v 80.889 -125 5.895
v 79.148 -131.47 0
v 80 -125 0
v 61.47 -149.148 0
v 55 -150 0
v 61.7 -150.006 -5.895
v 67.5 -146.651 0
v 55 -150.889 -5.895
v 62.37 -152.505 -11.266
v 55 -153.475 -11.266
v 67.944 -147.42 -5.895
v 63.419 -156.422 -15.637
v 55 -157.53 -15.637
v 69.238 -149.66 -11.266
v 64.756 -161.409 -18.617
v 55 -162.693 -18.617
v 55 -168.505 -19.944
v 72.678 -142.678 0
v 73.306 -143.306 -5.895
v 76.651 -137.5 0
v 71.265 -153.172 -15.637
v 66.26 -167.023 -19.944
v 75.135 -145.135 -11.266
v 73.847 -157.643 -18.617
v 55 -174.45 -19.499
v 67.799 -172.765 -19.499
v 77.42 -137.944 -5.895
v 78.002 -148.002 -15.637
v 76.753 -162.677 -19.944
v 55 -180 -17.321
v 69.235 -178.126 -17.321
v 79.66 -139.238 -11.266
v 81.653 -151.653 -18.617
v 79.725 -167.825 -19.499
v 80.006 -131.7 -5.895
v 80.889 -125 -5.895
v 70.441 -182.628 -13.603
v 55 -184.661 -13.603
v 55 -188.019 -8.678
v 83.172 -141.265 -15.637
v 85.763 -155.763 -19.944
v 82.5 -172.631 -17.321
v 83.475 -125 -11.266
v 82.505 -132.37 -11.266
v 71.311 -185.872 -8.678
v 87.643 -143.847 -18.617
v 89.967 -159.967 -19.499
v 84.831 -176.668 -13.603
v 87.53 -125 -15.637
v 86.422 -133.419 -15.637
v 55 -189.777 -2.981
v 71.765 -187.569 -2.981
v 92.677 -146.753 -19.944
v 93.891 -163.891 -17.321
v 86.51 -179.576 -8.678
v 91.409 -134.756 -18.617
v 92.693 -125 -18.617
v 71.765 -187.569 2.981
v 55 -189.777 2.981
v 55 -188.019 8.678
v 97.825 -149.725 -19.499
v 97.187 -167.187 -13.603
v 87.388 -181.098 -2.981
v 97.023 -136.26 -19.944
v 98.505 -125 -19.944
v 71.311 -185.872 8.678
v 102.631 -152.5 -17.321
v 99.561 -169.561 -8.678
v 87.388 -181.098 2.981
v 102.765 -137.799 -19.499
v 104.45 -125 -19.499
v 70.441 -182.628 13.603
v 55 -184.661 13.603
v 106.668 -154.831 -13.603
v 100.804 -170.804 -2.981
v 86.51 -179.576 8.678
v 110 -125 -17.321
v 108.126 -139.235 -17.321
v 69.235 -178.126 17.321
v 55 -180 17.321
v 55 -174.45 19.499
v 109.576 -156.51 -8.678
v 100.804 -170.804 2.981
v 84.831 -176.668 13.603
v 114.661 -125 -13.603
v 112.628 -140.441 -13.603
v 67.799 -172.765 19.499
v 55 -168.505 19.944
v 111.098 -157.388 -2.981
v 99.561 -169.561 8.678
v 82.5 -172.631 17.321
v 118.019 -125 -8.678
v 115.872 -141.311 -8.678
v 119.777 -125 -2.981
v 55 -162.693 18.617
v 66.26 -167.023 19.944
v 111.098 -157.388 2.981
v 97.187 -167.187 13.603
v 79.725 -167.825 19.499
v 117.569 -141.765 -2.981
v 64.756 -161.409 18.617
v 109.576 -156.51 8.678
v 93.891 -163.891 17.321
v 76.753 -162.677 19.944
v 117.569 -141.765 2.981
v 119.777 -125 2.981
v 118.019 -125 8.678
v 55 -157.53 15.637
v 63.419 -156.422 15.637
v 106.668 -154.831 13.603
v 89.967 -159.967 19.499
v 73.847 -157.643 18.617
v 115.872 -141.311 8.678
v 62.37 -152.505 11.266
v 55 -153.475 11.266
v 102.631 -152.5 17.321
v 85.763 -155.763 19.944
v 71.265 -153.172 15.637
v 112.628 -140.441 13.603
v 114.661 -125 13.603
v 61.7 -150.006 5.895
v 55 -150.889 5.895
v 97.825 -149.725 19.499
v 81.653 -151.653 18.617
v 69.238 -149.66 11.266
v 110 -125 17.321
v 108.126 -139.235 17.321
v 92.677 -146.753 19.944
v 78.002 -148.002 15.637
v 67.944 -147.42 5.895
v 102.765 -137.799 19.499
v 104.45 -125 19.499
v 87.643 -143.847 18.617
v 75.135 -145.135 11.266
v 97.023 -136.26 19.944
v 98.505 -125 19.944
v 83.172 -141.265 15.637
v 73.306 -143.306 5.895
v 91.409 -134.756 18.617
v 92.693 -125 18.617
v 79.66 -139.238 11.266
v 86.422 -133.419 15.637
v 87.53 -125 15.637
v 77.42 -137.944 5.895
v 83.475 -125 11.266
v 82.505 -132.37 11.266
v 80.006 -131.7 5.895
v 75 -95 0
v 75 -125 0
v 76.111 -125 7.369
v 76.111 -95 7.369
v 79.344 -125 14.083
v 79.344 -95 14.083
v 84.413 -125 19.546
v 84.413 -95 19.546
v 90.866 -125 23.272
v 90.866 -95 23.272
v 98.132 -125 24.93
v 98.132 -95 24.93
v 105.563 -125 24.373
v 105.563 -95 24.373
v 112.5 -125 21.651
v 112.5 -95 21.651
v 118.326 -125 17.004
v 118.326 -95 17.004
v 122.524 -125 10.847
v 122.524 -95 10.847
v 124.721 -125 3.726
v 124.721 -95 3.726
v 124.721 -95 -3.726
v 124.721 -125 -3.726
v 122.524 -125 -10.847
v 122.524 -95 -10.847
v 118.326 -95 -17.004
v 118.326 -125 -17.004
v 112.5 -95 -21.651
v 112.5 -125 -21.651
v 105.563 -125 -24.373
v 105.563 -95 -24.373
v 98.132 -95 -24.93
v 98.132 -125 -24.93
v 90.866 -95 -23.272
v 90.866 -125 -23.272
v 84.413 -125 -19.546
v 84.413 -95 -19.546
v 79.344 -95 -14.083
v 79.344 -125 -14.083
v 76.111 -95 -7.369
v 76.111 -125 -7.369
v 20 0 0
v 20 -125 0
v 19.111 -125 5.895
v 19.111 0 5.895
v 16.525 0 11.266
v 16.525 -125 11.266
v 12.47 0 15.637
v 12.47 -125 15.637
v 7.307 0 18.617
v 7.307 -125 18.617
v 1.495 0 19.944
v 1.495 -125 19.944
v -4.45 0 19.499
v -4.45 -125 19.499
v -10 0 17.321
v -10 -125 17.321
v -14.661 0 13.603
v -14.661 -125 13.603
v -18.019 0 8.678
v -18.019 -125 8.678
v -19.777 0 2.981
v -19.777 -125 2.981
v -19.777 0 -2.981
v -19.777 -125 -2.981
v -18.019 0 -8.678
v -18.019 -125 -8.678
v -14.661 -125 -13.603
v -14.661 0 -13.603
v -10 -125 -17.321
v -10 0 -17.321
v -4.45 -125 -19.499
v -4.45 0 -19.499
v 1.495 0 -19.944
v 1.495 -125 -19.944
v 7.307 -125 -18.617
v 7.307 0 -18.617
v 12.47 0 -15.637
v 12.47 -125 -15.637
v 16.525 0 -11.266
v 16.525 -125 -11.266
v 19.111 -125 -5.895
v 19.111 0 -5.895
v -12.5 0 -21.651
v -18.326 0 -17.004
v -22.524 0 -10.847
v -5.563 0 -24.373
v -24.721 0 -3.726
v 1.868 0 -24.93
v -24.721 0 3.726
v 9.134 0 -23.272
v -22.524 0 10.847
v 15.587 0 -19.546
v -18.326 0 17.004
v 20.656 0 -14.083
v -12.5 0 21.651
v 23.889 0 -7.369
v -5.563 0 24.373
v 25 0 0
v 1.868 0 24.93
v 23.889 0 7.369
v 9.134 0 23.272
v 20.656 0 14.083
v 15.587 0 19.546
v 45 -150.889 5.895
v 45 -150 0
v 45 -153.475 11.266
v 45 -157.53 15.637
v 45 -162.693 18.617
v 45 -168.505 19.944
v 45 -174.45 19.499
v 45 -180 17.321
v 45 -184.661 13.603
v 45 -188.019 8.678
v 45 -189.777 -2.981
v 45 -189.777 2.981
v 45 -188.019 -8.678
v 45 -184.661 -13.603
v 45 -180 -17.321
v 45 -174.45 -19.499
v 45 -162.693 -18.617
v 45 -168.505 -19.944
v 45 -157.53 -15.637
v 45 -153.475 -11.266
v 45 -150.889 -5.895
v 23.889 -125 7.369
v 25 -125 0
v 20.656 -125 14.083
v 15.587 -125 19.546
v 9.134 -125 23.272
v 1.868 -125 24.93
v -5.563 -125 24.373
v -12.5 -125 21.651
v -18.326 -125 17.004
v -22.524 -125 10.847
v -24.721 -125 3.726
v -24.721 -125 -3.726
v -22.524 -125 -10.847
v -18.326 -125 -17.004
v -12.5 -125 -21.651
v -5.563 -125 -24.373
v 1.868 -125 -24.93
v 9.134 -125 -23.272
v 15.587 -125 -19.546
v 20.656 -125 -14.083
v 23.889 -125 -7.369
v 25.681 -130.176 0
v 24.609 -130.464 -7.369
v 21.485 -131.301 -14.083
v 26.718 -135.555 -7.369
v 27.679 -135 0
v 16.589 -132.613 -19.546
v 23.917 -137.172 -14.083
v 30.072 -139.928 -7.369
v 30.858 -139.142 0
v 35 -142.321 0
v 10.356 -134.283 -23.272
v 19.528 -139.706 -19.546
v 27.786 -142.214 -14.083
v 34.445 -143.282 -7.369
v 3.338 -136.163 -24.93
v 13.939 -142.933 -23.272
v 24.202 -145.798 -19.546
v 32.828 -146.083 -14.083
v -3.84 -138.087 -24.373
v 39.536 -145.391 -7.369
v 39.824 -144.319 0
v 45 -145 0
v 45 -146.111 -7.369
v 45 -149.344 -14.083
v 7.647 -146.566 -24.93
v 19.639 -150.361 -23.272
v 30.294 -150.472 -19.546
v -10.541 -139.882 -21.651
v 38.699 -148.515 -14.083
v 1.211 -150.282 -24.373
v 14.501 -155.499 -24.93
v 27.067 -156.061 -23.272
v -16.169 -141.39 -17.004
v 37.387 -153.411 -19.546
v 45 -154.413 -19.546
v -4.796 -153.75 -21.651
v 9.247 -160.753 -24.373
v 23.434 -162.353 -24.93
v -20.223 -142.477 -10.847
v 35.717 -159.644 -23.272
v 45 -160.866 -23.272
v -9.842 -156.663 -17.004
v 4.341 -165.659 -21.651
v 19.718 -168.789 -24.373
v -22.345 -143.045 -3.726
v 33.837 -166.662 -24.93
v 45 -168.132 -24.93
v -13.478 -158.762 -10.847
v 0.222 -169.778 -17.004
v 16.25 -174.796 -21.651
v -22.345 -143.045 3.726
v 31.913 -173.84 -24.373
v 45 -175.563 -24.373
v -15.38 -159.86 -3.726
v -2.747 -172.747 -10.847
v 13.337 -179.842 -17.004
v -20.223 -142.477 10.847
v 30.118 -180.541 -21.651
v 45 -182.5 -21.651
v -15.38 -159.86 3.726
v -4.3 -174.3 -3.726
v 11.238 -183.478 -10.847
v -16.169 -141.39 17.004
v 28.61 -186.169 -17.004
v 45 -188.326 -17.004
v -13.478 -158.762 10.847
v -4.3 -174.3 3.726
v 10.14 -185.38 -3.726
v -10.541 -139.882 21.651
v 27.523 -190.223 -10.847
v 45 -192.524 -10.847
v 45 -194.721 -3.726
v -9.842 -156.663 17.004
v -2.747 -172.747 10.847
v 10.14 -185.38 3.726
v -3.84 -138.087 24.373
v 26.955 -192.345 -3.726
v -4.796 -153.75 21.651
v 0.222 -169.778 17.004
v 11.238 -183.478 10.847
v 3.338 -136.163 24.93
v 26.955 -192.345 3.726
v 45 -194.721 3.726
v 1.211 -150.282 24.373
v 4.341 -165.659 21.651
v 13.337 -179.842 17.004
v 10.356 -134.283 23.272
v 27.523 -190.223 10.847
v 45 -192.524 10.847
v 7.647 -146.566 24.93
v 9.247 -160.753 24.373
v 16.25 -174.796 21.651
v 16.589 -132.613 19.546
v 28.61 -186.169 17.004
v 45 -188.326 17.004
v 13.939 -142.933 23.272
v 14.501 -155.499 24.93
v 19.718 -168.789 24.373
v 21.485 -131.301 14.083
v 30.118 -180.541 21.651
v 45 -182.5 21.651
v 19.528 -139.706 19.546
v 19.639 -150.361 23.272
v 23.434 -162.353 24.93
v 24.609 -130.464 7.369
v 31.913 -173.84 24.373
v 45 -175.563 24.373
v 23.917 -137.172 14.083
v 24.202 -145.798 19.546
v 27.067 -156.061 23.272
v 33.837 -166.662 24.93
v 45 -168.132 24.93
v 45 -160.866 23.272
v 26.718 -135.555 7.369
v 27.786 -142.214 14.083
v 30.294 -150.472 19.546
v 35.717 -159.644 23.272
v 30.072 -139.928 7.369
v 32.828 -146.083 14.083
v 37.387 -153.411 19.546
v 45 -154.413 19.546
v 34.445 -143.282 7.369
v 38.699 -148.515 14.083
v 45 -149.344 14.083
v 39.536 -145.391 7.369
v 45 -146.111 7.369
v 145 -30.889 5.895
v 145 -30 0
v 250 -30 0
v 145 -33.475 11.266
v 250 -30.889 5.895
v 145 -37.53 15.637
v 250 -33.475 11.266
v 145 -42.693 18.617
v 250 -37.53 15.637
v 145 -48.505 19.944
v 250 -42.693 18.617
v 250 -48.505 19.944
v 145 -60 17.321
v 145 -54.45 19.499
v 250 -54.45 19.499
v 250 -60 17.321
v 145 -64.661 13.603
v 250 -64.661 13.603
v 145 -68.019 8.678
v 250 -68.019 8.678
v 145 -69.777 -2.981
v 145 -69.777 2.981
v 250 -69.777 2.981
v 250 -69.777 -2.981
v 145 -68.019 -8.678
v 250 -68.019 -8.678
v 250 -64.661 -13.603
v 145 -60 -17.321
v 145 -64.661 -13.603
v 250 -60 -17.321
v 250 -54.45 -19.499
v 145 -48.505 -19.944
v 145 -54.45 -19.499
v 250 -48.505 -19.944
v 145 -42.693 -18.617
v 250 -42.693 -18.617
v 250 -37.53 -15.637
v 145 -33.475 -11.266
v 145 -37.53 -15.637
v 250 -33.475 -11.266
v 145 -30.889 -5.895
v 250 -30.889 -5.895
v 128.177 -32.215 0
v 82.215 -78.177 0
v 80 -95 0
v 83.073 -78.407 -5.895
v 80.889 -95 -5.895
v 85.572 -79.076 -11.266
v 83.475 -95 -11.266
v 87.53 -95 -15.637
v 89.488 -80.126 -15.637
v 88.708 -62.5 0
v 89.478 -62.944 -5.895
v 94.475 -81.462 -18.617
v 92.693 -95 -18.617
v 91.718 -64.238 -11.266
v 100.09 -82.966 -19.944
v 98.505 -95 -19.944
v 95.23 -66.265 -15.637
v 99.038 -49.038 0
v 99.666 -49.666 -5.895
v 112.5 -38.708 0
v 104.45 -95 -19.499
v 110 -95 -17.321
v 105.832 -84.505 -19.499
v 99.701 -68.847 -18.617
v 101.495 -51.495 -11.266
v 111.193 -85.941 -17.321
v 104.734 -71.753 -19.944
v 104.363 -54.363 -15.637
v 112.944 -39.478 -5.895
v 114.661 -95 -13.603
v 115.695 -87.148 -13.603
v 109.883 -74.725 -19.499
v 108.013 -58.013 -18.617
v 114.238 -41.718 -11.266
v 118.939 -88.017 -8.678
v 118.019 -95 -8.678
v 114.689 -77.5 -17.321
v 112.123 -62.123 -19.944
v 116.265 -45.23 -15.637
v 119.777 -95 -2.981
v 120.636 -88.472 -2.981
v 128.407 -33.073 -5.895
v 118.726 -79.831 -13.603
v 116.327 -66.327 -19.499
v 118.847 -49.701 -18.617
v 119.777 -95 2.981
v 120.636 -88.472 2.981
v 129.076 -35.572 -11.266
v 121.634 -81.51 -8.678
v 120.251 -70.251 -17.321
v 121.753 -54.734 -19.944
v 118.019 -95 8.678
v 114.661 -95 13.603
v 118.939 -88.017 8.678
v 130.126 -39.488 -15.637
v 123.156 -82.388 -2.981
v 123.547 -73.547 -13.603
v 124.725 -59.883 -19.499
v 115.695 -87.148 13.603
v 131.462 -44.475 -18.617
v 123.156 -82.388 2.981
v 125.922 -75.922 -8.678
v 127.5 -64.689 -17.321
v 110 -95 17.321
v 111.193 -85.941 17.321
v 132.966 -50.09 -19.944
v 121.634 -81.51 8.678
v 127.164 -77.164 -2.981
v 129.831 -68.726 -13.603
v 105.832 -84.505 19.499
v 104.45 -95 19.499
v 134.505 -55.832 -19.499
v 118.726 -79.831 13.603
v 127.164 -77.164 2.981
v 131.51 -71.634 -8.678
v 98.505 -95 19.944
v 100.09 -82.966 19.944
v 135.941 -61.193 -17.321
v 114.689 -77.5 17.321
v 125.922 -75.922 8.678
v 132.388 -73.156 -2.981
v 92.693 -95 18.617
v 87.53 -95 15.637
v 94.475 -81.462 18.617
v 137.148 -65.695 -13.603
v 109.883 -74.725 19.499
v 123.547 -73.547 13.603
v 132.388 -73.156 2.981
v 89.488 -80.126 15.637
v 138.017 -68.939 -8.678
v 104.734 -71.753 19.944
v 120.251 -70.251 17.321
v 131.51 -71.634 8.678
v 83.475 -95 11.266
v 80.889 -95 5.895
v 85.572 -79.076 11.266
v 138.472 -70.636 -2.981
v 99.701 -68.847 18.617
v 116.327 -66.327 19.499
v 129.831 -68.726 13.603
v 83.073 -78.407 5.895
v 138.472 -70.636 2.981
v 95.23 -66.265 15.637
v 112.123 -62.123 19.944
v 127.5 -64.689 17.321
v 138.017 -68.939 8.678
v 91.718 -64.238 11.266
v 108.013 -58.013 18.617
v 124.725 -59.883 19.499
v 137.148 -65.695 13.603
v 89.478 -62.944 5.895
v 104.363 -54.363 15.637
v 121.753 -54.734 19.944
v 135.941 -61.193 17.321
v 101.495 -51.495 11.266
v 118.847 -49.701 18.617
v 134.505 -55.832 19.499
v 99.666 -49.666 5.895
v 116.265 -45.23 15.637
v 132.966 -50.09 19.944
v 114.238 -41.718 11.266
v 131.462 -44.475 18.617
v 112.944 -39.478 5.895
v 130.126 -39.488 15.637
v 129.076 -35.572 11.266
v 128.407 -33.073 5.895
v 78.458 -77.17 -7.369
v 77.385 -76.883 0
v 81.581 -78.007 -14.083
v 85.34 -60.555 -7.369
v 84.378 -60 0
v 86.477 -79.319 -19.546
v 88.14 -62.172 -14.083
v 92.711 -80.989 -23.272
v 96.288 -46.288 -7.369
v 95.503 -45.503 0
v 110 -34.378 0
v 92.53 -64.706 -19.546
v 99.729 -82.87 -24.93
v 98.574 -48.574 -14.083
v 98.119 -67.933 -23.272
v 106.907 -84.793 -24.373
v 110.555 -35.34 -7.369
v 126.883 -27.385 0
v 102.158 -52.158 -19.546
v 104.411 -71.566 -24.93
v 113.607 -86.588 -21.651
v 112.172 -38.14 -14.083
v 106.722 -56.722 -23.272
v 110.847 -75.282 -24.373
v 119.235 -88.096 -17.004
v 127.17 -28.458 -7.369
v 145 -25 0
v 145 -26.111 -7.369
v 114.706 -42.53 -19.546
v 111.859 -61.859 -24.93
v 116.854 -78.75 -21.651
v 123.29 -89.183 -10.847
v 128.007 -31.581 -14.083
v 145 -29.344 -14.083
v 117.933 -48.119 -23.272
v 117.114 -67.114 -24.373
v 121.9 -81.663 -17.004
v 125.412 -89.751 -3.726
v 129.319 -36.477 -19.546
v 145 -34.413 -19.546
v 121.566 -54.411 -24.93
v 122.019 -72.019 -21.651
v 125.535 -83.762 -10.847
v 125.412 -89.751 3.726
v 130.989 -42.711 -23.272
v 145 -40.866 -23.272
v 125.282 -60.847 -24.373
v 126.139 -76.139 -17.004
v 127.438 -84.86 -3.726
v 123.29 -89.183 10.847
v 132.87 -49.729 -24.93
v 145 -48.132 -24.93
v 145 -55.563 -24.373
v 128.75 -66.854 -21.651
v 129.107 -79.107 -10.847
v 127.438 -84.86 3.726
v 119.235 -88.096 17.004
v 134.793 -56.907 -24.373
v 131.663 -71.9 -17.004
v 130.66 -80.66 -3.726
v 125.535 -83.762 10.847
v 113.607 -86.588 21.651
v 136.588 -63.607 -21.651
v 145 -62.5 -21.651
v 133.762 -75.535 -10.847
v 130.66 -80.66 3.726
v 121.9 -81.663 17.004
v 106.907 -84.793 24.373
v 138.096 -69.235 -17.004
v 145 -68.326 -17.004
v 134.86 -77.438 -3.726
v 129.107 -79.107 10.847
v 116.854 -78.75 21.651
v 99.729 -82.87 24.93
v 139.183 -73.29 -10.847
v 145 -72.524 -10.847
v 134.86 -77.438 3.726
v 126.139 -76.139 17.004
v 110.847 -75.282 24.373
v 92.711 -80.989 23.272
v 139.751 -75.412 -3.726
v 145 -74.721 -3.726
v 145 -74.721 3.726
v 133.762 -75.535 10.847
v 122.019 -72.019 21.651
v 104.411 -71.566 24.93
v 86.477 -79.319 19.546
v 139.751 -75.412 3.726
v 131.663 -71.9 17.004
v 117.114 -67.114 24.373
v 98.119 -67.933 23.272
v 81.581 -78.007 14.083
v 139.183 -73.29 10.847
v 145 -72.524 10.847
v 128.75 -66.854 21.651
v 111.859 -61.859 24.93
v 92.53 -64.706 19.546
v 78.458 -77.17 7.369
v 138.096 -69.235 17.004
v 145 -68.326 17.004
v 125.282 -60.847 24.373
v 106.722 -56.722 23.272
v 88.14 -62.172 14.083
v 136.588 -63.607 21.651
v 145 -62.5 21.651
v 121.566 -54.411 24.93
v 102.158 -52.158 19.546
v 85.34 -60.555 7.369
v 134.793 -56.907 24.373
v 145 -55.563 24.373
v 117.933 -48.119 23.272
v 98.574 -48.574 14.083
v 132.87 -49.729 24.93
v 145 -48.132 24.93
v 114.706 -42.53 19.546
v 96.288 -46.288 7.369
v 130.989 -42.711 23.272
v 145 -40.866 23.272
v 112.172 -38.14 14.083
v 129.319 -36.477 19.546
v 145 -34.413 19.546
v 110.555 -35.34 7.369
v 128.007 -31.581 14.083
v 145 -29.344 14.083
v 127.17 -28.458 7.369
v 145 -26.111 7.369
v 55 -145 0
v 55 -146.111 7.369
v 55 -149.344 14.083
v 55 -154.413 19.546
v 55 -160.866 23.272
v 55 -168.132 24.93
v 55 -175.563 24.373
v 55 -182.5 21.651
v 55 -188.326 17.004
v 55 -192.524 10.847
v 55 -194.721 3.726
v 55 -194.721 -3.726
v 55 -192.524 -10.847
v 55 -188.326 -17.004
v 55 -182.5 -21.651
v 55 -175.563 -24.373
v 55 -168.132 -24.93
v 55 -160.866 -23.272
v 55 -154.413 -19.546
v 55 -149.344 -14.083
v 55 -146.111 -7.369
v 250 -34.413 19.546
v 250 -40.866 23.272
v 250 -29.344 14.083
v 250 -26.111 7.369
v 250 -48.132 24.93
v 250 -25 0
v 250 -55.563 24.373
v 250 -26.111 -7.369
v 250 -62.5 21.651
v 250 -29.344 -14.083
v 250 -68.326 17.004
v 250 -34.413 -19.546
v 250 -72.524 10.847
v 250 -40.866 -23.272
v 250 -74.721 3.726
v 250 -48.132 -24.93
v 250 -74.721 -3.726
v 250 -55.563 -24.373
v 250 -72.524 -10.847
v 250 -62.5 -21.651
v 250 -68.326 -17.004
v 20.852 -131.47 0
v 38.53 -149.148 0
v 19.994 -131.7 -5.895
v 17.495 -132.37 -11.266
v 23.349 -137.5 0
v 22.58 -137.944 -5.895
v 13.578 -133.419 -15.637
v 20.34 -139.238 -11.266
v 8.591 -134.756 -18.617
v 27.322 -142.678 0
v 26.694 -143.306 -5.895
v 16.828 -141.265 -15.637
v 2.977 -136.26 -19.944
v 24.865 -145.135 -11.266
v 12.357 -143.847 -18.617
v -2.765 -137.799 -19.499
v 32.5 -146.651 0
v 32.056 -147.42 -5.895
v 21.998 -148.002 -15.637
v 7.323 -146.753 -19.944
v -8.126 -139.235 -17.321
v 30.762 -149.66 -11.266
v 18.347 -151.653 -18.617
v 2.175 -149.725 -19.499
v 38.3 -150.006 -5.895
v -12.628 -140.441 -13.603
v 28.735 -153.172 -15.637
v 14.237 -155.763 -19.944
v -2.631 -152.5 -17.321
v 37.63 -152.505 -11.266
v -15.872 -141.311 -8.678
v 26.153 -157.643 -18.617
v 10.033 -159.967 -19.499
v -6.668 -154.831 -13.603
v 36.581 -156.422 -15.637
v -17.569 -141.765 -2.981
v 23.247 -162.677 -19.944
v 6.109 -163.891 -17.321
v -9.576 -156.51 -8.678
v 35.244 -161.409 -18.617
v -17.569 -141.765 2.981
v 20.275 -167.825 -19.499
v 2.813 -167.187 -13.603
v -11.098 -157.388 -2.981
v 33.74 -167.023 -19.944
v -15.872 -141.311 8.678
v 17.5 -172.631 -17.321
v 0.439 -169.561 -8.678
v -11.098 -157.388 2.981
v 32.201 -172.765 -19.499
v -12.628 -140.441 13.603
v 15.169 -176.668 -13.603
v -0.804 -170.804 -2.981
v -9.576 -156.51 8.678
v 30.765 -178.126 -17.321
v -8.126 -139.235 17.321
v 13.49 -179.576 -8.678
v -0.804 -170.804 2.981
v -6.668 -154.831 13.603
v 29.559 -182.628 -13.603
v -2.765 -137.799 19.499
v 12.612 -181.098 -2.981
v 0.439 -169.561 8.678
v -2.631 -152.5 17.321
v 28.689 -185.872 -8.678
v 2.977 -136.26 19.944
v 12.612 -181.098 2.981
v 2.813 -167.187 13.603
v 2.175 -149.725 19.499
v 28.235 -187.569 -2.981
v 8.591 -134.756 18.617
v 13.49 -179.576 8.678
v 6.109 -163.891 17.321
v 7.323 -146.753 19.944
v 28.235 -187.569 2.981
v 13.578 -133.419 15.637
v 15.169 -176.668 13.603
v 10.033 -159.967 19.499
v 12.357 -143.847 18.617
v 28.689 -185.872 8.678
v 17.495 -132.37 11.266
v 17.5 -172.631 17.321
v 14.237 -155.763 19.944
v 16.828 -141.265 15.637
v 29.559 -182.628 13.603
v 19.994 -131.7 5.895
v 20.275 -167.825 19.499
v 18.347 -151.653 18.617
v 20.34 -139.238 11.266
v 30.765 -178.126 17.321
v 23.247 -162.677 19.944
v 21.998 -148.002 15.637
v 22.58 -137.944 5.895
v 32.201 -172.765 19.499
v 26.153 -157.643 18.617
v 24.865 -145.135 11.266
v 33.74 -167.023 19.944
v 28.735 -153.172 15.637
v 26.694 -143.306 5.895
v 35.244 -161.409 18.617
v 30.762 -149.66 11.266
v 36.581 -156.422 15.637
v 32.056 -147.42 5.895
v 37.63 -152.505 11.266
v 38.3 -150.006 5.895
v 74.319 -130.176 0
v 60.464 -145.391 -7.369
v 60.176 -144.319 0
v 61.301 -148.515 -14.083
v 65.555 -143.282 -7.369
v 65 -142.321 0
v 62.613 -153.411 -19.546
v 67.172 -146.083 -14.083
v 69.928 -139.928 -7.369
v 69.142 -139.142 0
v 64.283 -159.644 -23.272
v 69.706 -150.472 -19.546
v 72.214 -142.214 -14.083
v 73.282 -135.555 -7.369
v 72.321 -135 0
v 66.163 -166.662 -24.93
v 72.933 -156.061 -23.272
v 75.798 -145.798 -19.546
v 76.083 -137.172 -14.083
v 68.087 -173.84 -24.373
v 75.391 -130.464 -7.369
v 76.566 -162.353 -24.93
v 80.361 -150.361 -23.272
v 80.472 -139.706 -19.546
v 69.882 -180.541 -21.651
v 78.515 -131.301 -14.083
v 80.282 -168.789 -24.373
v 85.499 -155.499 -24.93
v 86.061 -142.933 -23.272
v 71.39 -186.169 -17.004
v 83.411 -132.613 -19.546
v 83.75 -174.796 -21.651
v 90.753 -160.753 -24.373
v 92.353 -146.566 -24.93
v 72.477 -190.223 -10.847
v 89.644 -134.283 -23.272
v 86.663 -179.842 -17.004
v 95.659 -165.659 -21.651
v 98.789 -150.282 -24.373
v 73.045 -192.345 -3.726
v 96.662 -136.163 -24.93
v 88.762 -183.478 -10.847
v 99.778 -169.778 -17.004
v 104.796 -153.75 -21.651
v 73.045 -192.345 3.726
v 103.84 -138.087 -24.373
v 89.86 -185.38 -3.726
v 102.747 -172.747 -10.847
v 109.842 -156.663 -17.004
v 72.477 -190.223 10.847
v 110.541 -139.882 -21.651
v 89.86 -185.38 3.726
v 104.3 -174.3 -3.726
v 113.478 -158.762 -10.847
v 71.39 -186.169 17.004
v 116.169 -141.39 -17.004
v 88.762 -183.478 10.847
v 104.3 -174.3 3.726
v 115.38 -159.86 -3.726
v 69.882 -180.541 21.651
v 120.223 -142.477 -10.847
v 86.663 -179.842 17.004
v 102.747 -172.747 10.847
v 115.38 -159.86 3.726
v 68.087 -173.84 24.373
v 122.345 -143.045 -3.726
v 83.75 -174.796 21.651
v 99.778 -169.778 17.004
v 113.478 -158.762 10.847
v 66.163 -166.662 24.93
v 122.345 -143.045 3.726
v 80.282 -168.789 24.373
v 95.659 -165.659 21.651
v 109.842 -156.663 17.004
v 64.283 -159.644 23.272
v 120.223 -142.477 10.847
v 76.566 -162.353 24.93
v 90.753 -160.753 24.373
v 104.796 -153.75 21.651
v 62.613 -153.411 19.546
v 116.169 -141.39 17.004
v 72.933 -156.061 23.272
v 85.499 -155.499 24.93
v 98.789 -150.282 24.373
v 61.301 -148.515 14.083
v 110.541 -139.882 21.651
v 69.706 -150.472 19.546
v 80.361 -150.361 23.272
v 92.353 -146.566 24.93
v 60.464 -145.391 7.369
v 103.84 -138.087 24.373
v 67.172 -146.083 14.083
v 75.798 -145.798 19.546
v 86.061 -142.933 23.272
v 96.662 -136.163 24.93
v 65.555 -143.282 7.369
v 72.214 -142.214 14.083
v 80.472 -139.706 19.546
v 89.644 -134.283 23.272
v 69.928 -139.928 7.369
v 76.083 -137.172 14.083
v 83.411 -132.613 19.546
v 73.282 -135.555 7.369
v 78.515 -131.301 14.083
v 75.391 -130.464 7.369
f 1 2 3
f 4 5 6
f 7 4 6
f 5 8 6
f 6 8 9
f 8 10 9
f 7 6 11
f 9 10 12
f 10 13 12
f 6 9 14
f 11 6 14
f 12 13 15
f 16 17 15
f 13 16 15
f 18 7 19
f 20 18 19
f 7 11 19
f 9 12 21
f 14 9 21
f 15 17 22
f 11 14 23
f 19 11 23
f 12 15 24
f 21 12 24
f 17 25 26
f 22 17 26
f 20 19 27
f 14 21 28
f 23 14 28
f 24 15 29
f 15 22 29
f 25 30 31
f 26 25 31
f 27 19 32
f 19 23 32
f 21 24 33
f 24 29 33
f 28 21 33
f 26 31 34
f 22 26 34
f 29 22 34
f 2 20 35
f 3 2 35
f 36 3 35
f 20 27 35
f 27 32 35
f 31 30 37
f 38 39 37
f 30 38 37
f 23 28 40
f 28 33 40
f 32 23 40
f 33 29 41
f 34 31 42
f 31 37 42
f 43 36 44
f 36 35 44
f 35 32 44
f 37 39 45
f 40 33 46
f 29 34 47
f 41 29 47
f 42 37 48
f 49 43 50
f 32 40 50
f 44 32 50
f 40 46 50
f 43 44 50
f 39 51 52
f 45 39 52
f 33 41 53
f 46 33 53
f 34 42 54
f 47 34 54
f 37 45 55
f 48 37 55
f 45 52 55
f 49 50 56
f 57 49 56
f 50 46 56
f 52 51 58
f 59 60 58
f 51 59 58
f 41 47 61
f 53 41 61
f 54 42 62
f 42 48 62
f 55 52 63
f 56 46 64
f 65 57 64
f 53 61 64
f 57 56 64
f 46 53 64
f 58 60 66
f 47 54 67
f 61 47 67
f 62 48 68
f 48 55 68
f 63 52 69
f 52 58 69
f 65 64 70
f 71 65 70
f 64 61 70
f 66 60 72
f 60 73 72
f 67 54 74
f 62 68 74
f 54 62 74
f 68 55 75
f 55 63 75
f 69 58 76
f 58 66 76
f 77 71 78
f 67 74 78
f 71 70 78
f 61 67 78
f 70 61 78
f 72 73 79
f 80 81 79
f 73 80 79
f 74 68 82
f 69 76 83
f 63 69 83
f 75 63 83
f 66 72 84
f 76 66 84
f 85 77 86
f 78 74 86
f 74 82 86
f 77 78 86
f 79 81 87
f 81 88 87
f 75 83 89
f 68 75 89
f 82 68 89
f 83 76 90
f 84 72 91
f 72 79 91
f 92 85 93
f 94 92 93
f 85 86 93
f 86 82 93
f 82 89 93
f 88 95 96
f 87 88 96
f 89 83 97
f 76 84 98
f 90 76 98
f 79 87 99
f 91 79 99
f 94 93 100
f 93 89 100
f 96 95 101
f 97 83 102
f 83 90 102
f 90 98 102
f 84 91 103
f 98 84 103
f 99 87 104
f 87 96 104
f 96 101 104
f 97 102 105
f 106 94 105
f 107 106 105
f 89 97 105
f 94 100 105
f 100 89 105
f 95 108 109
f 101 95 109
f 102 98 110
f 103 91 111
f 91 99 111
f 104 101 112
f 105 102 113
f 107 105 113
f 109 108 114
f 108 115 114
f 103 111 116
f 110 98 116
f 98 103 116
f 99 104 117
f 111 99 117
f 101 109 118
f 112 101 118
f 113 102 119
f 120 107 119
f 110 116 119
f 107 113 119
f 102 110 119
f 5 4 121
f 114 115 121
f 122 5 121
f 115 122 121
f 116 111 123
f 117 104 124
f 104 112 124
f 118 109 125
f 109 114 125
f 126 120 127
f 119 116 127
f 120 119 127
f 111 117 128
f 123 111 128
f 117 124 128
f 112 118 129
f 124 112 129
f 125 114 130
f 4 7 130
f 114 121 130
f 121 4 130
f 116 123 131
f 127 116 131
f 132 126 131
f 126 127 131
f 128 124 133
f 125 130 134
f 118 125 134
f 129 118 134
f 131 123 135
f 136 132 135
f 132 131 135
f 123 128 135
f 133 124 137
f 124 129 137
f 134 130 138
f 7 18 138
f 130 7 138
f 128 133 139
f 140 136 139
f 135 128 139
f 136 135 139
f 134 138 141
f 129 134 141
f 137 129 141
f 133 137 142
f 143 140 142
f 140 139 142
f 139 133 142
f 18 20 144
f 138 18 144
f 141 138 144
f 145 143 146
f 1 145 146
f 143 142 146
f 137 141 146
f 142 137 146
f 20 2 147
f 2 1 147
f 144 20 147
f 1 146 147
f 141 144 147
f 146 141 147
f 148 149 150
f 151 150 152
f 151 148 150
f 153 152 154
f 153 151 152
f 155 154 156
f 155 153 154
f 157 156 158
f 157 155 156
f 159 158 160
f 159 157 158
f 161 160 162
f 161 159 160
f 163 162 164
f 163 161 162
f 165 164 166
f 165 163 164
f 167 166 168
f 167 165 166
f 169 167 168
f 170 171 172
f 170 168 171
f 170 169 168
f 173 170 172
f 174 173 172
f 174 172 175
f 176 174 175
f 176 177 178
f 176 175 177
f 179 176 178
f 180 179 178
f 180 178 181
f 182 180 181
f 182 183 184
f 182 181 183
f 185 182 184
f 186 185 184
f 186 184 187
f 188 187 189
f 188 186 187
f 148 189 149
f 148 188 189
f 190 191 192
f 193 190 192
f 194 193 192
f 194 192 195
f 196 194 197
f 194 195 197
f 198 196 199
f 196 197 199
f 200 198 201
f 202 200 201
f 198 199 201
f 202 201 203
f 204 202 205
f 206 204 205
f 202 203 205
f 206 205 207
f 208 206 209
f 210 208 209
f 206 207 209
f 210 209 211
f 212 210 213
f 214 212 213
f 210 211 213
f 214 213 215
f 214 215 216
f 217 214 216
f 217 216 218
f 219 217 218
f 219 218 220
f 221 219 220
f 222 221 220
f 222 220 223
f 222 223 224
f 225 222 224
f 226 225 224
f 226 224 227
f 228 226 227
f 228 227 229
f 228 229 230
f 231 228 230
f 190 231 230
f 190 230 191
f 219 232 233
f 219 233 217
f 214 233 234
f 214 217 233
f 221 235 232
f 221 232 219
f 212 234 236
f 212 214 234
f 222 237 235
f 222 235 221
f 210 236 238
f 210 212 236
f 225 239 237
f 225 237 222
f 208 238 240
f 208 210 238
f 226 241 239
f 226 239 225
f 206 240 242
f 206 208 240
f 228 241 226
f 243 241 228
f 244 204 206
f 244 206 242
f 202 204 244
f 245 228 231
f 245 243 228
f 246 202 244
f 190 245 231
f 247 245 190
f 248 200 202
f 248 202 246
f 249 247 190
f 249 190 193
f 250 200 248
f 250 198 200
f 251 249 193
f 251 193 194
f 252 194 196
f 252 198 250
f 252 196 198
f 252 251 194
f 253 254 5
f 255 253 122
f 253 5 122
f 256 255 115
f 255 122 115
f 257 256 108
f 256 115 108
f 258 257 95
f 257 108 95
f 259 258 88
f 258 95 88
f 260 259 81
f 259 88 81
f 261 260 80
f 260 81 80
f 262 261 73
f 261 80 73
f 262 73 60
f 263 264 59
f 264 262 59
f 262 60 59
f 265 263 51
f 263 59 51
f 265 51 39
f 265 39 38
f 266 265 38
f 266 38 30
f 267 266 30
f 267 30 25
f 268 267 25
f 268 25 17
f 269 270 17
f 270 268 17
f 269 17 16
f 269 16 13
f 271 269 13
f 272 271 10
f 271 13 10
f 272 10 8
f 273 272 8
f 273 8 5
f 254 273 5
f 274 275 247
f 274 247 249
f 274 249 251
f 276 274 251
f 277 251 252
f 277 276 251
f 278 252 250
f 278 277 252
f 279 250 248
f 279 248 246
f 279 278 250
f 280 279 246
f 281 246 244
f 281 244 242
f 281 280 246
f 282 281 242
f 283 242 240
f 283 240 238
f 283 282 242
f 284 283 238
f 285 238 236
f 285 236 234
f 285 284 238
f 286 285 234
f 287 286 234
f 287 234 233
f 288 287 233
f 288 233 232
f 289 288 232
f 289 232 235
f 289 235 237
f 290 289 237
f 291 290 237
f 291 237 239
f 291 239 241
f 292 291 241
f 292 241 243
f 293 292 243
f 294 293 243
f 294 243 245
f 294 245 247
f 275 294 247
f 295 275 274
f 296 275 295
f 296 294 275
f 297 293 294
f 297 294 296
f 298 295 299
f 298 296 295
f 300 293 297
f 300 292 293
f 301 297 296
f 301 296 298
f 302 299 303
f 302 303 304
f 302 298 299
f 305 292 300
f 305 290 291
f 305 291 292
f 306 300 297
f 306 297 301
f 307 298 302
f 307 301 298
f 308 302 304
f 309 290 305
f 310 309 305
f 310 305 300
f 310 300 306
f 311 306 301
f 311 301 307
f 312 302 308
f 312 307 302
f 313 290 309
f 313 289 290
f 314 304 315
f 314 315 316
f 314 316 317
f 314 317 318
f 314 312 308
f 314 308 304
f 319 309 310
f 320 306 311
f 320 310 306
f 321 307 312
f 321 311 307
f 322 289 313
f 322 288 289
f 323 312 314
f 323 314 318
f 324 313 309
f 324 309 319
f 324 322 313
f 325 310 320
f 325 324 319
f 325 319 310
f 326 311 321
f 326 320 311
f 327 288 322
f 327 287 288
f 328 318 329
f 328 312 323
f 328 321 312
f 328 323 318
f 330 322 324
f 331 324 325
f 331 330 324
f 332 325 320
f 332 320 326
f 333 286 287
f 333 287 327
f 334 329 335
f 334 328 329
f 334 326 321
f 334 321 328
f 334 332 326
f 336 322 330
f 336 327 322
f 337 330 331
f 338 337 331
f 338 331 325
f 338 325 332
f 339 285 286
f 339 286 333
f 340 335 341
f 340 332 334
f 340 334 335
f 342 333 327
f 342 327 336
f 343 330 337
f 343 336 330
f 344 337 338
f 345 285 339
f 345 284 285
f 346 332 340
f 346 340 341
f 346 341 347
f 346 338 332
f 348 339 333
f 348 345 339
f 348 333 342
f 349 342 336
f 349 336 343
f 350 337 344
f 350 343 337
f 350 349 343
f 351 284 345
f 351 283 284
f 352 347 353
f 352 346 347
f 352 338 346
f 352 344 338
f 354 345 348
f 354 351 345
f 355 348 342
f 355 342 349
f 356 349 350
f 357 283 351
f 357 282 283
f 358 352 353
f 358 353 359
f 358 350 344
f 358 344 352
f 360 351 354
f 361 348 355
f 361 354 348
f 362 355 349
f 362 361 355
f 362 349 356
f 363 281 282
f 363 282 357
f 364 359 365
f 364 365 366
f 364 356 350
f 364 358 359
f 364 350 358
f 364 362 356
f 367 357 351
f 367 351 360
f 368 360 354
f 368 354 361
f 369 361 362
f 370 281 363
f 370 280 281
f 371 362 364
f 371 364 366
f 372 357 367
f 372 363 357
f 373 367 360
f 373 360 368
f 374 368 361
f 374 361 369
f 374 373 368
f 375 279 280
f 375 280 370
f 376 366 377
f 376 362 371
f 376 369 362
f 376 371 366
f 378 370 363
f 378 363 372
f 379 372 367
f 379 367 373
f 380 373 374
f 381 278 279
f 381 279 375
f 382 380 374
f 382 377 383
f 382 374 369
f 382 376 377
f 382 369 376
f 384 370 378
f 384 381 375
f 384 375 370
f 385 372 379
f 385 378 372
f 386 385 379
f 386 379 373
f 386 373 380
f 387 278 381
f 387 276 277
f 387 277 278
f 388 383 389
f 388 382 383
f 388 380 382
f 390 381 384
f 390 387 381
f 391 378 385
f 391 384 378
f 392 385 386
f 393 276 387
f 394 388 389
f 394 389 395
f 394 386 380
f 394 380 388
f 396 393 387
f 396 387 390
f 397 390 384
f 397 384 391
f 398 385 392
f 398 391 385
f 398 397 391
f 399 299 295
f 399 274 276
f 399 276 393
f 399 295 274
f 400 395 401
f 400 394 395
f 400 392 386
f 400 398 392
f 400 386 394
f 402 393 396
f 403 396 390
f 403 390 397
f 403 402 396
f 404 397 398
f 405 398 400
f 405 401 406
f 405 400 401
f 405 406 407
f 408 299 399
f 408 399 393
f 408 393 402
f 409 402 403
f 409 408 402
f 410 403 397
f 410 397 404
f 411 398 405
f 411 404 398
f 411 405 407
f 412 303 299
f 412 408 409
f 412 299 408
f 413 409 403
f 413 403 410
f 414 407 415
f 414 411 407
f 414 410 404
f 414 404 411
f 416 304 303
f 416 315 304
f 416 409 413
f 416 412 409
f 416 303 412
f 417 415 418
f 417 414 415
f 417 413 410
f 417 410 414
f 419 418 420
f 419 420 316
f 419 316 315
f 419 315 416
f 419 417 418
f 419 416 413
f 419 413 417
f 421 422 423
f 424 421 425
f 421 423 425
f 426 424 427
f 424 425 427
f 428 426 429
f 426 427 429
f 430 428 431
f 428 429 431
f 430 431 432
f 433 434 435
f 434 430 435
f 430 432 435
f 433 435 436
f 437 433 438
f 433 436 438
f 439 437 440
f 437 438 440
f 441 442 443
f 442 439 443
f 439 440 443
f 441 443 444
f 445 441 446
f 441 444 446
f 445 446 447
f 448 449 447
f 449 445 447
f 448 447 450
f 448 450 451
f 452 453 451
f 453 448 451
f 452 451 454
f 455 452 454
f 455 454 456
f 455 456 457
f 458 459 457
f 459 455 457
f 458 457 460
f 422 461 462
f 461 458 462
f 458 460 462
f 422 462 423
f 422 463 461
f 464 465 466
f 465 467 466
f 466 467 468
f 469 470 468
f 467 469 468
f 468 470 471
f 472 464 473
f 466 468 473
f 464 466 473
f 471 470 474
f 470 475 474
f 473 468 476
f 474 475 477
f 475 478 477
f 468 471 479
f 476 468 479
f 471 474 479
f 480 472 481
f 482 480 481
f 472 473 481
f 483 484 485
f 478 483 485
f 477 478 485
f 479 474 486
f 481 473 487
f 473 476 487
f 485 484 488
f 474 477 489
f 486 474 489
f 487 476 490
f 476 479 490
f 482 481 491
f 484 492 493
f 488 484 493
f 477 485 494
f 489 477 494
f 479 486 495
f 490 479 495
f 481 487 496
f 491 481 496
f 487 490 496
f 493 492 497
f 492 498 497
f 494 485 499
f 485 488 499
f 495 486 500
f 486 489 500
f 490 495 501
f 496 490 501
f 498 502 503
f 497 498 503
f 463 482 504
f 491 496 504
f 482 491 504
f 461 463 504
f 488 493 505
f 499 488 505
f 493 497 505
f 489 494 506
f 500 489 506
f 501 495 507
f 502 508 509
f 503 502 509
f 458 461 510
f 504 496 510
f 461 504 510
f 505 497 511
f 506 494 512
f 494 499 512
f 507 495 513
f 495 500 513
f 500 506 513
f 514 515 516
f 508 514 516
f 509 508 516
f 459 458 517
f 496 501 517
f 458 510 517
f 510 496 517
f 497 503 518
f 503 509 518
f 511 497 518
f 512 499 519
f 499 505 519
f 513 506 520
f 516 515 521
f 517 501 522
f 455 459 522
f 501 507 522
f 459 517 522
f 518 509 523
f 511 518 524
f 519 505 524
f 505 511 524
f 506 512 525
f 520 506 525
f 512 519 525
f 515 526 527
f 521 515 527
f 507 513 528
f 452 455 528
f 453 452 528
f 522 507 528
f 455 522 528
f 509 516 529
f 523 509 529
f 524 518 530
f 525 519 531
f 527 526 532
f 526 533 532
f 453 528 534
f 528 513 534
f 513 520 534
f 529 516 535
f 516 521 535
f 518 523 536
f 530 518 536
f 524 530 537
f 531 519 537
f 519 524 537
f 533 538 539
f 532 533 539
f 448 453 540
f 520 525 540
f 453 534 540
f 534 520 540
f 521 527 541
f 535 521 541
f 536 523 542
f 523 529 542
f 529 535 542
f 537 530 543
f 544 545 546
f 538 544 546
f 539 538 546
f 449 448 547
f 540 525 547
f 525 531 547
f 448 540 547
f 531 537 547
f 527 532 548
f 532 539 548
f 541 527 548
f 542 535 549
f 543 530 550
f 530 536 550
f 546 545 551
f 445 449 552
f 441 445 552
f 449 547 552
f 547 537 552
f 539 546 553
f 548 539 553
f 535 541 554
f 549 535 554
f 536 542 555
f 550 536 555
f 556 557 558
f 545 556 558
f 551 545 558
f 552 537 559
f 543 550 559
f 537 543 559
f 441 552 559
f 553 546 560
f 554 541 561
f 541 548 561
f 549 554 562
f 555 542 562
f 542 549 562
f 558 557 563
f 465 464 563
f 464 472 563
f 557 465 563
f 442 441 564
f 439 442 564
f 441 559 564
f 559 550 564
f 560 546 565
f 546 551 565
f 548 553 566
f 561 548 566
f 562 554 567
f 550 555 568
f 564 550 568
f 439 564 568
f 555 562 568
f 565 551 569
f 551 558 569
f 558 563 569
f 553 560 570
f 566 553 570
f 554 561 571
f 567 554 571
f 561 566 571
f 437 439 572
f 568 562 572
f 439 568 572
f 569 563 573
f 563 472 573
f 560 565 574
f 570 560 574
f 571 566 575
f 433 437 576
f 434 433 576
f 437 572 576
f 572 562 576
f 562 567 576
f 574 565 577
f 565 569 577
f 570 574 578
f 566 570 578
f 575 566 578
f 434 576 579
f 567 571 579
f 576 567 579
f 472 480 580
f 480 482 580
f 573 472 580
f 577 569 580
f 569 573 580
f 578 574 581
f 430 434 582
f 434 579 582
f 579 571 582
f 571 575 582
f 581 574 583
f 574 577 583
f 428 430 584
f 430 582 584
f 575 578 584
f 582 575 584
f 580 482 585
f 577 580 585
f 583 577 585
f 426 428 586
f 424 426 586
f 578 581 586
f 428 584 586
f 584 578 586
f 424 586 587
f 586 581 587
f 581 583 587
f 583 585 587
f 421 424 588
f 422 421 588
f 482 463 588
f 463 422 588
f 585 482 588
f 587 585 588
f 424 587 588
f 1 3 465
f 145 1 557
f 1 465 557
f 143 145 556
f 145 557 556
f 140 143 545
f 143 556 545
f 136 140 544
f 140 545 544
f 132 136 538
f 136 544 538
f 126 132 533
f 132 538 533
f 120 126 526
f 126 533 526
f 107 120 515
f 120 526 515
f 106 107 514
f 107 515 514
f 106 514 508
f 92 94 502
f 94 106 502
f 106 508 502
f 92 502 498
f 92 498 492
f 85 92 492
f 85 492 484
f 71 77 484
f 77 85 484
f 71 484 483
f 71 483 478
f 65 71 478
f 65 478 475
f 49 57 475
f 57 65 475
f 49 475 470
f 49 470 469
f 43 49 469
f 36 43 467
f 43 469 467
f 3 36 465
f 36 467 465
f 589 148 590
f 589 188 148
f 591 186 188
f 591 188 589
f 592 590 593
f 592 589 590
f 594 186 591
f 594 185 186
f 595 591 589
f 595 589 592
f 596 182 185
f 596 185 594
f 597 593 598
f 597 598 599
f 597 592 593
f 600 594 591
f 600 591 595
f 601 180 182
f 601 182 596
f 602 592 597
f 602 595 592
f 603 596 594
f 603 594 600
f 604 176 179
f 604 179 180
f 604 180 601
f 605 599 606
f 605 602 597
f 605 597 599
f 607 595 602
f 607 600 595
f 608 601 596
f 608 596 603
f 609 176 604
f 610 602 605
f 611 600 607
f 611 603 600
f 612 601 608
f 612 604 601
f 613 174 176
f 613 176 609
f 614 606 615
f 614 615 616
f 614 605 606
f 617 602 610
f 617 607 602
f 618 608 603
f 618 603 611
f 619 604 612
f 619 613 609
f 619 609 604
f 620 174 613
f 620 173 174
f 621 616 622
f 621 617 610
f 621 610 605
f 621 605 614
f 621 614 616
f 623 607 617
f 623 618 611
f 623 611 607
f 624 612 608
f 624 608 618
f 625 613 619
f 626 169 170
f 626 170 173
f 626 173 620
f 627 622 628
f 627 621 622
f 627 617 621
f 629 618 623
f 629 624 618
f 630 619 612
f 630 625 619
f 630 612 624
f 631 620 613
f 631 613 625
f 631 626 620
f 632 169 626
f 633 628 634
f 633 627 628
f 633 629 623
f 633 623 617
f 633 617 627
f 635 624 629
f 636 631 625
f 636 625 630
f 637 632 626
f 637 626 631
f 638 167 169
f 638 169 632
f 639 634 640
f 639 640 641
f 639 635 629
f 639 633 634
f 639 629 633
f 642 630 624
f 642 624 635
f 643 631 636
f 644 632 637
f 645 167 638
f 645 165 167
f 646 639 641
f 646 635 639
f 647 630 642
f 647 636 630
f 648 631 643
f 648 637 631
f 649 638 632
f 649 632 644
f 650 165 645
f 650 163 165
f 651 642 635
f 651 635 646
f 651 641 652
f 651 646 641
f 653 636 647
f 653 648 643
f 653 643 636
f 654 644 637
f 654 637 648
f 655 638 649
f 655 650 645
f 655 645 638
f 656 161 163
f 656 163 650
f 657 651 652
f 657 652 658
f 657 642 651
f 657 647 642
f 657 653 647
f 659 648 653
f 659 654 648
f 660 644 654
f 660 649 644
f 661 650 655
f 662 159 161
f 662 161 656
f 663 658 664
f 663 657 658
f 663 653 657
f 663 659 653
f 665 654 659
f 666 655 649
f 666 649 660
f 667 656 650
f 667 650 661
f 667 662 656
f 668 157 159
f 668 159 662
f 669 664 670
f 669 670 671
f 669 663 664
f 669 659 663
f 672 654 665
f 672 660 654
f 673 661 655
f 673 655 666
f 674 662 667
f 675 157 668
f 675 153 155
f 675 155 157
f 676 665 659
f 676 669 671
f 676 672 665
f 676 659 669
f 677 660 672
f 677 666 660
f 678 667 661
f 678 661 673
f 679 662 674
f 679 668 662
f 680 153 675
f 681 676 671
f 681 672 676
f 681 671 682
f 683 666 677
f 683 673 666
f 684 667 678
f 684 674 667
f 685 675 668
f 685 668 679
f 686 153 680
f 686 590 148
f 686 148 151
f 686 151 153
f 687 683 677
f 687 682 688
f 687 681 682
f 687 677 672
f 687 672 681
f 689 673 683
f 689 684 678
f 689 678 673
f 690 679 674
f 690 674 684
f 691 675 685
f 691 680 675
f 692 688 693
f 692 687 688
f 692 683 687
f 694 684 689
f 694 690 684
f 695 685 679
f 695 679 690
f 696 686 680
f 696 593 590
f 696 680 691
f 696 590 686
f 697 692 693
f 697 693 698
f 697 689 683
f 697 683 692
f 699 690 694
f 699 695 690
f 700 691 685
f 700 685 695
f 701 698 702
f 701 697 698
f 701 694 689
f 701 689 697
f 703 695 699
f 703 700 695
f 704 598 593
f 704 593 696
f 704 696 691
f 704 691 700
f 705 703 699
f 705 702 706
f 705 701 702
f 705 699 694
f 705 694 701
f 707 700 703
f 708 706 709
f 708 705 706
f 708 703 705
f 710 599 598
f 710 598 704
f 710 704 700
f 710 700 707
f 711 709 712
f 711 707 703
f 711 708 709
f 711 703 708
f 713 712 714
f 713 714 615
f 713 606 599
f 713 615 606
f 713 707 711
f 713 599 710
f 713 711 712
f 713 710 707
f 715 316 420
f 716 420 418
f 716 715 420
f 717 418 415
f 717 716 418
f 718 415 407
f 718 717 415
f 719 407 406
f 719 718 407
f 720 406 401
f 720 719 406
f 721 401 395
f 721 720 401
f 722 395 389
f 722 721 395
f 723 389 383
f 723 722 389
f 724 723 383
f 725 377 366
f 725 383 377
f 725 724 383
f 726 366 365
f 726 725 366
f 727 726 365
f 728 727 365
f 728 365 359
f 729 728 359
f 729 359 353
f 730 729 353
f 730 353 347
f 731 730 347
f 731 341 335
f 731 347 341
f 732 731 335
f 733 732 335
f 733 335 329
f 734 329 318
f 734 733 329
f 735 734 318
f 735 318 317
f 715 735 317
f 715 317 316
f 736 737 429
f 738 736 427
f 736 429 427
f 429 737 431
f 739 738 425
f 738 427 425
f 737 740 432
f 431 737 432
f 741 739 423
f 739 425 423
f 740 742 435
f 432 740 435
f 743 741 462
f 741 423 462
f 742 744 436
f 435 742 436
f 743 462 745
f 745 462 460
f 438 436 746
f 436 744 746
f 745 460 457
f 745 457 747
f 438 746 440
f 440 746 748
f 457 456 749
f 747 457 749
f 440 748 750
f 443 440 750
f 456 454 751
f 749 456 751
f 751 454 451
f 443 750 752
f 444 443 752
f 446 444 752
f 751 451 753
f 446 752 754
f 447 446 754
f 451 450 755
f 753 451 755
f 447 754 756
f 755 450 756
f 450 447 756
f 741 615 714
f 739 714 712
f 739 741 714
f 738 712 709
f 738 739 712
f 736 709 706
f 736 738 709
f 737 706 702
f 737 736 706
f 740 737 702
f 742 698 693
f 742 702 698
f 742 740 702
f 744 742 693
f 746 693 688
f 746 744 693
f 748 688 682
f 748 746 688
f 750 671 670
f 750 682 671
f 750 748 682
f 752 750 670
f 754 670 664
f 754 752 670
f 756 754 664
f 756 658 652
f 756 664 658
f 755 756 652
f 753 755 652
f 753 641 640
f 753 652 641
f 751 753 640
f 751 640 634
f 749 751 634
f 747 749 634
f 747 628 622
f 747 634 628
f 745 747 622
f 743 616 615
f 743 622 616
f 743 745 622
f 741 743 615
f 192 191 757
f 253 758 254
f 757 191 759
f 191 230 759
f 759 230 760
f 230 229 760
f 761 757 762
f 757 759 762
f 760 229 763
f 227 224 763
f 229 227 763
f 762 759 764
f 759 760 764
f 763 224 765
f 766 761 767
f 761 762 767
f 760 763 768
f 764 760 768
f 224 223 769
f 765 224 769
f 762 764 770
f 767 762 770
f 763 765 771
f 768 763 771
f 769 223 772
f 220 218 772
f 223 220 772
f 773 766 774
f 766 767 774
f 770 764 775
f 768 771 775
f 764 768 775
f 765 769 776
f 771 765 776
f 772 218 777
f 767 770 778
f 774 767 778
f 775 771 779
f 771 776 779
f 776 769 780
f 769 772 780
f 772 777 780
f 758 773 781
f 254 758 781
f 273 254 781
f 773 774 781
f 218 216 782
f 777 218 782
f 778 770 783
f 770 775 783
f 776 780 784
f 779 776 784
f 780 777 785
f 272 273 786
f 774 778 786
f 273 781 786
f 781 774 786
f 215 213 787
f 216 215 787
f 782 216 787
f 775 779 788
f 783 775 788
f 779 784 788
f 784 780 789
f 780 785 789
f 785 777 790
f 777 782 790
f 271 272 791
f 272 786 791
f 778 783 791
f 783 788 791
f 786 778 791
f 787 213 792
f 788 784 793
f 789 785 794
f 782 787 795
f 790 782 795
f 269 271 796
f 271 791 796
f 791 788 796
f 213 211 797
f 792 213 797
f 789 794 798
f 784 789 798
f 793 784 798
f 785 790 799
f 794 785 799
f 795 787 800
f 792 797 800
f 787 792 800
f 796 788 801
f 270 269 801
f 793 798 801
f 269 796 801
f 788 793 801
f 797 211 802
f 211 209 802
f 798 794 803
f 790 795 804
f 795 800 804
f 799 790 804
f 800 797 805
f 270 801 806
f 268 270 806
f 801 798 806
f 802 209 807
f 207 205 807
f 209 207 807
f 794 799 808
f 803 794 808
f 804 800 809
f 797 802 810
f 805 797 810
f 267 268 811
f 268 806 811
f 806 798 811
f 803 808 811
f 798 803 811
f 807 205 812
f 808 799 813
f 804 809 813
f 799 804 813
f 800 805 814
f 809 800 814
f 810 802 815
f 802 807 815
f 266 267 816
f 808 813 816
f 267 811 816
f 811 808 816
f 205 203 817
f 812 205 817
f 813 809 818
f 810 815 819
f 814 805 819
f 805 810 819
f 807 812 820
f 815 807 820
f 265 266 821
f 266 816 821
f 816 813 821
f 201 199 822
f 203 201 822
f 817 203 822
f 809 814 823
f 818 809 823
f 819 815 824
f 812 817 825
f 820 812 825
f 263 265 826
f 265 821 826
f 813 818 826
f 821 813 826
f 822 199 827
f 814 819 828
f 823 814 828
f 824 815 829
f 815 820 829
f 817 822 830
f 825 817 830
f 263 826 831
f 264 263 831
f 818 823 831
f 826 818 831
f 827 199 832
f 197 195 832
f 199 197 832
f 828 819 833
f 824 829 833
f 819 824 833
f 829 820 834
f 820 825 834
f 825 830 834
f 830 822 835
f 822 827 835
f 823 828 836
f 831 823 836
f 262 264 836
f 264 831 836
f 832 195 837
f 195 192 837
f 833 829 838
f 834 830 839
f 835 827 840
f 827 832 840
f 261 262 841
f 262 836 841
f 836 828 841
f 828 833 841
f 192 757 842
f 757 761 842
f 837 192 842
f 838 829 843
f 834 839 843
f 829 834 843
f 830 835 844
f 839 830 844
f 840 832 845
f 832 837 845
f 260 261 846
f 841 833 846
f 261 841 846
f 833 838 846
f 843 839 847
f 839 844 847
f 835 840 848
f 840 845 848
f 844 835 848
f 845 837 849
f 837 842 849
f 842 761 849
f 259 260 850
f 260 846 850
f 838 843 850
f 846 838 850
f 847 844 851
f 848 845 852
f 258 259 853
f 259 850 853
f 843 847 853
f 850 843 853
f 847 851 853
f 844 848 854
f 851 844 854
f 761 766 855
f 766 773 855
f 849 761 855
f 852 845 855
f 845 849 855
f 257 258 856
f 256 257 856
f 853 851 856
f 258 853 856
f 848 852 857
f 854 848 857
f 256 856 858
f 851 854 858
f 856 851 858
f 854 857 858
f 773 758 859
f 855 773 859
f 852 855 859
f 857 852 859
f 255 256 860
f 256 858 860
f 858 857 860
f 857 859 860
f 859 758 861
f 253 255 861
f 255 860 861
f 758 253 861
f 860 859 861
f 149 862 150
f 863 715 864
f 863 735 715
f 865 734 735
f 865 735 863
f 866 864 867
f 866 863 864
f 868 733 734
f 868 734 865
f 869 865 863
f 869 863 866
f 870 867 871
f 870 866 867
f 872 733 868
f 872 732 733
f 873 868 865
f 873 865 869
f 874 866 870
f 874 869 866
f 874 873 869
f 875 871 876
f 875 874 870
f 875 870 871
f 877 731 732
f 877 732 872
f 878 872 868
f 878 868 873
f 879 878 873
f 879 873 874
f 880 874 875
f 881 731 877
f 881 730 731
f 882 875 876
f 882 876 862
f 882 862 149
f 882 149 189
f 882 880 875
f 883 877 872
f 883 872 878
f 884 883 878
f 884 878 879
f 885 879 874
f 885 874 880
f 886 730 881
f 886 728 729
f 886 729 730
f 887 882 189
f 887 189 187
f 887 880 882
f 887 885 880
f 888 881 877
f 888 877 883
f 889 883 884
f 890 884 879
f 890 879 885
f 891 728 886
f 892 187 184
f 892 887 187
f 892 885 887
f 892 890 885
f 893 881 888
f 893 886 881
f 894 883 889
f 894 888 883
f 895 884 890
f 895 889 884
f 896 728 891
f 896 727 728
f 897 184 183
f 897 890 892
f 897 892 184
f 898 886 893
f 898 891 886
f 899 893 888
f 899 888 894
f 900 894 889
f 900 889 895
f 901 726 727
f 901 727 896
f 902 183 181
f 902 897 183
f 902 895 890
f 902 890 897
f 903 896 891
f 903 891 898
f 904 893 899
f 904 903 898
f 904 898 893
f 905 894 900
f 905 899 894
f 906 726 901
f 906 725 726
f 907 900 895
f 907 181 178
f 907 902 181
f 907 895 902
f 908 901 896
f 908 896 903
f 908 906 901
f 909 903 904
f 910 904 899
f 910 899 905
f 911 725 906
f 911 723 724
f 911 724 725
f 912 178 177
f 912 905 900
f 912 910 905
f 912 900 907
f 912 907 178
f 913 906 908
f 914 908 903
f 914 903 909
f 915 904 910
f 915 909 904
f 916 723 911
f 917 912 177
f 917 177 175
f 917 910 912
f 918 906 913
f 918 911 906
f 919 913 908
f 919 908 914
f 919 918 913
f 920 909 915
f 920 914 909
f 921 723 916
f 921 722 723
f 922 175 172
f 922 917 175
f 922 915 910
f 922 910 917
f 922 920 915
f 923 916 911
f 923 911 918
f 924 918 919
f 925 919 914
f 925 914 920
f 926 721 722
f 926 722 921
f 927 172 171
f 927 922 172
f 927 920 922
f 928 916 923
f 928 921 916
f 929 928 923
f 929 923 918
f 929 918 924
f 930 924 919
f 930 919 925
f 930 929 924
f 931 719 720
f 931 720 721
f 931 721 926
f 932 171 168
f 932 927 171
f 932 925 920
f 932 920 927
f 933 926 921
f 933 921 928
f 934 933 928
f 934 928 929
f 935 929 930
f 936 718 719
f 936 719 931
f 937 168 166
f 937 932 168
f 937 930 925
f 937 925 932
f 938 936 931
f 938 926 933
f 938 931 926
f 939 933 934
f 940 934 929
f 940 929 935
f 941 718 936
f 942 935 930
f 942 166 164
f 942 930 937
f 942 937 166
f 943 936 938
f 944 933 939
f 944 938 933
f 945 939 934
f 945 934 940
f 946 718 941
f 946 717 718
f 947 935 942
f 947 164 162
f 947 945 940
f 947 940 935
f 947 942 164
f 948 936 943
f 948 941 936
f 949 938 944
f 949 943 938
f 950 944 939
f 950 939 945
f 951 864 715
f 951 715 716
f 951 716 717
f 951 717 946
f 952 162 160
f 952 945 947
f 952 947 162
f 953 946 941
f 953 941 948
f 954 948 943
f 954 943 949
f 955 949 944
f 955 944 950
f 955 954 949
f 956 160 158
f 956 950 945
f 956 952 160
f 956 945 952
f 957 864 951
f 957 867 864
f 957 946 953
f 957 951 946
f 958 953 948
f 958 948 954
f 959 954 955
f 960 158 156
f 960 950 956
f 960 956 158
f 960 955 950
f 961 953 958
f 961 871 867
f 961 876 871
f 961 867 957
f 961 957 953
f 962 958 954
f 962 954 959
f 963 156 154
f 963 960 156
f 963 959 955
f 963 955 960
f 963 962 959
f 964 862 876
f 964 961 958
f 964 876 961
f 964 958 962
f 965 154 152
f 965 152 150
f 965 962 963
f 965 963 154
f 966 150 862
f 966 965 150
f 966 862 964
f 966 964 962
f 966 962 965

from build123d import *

# Parameters (mm, degrees)
CROQUIS3_R   = 25
CROQUIS3_R_2 = 20


with BuildPart() as part:
    # Barrer1: sweep along a path in Croquis2
    with BuildLine(Plane.XY) as barrer1_path:
        Line((0, 0), (0, -125))
        ThreePointArc((0, -125), (13.180194847, -156.819805153), (45, -170))
        Line((45, -170), (55, -170))
        ThreePointArc((55, -170), (86.819805153, -156.819805153), (100, -125))
        Line((100, -125), (100, -95))
        ThreePointArc((100, -95), (113.180194847, -63.180194847), (145, -50))
        Line((145, -50), (250, -50))
    # Croquis3 → Barrer1 (sweep)
    with BuildSketch(Plane(origin=(0, 0, 0), x_dir=(1, 0, 0), z_dir=(0, 1, 0))):
        Circle(CROQUIS3_R)
        Circle(CROQUIS3_R_2, mode=Mode.SUBTRACT)
    sweep(path=barrer1_path.line)


solid = part.part
